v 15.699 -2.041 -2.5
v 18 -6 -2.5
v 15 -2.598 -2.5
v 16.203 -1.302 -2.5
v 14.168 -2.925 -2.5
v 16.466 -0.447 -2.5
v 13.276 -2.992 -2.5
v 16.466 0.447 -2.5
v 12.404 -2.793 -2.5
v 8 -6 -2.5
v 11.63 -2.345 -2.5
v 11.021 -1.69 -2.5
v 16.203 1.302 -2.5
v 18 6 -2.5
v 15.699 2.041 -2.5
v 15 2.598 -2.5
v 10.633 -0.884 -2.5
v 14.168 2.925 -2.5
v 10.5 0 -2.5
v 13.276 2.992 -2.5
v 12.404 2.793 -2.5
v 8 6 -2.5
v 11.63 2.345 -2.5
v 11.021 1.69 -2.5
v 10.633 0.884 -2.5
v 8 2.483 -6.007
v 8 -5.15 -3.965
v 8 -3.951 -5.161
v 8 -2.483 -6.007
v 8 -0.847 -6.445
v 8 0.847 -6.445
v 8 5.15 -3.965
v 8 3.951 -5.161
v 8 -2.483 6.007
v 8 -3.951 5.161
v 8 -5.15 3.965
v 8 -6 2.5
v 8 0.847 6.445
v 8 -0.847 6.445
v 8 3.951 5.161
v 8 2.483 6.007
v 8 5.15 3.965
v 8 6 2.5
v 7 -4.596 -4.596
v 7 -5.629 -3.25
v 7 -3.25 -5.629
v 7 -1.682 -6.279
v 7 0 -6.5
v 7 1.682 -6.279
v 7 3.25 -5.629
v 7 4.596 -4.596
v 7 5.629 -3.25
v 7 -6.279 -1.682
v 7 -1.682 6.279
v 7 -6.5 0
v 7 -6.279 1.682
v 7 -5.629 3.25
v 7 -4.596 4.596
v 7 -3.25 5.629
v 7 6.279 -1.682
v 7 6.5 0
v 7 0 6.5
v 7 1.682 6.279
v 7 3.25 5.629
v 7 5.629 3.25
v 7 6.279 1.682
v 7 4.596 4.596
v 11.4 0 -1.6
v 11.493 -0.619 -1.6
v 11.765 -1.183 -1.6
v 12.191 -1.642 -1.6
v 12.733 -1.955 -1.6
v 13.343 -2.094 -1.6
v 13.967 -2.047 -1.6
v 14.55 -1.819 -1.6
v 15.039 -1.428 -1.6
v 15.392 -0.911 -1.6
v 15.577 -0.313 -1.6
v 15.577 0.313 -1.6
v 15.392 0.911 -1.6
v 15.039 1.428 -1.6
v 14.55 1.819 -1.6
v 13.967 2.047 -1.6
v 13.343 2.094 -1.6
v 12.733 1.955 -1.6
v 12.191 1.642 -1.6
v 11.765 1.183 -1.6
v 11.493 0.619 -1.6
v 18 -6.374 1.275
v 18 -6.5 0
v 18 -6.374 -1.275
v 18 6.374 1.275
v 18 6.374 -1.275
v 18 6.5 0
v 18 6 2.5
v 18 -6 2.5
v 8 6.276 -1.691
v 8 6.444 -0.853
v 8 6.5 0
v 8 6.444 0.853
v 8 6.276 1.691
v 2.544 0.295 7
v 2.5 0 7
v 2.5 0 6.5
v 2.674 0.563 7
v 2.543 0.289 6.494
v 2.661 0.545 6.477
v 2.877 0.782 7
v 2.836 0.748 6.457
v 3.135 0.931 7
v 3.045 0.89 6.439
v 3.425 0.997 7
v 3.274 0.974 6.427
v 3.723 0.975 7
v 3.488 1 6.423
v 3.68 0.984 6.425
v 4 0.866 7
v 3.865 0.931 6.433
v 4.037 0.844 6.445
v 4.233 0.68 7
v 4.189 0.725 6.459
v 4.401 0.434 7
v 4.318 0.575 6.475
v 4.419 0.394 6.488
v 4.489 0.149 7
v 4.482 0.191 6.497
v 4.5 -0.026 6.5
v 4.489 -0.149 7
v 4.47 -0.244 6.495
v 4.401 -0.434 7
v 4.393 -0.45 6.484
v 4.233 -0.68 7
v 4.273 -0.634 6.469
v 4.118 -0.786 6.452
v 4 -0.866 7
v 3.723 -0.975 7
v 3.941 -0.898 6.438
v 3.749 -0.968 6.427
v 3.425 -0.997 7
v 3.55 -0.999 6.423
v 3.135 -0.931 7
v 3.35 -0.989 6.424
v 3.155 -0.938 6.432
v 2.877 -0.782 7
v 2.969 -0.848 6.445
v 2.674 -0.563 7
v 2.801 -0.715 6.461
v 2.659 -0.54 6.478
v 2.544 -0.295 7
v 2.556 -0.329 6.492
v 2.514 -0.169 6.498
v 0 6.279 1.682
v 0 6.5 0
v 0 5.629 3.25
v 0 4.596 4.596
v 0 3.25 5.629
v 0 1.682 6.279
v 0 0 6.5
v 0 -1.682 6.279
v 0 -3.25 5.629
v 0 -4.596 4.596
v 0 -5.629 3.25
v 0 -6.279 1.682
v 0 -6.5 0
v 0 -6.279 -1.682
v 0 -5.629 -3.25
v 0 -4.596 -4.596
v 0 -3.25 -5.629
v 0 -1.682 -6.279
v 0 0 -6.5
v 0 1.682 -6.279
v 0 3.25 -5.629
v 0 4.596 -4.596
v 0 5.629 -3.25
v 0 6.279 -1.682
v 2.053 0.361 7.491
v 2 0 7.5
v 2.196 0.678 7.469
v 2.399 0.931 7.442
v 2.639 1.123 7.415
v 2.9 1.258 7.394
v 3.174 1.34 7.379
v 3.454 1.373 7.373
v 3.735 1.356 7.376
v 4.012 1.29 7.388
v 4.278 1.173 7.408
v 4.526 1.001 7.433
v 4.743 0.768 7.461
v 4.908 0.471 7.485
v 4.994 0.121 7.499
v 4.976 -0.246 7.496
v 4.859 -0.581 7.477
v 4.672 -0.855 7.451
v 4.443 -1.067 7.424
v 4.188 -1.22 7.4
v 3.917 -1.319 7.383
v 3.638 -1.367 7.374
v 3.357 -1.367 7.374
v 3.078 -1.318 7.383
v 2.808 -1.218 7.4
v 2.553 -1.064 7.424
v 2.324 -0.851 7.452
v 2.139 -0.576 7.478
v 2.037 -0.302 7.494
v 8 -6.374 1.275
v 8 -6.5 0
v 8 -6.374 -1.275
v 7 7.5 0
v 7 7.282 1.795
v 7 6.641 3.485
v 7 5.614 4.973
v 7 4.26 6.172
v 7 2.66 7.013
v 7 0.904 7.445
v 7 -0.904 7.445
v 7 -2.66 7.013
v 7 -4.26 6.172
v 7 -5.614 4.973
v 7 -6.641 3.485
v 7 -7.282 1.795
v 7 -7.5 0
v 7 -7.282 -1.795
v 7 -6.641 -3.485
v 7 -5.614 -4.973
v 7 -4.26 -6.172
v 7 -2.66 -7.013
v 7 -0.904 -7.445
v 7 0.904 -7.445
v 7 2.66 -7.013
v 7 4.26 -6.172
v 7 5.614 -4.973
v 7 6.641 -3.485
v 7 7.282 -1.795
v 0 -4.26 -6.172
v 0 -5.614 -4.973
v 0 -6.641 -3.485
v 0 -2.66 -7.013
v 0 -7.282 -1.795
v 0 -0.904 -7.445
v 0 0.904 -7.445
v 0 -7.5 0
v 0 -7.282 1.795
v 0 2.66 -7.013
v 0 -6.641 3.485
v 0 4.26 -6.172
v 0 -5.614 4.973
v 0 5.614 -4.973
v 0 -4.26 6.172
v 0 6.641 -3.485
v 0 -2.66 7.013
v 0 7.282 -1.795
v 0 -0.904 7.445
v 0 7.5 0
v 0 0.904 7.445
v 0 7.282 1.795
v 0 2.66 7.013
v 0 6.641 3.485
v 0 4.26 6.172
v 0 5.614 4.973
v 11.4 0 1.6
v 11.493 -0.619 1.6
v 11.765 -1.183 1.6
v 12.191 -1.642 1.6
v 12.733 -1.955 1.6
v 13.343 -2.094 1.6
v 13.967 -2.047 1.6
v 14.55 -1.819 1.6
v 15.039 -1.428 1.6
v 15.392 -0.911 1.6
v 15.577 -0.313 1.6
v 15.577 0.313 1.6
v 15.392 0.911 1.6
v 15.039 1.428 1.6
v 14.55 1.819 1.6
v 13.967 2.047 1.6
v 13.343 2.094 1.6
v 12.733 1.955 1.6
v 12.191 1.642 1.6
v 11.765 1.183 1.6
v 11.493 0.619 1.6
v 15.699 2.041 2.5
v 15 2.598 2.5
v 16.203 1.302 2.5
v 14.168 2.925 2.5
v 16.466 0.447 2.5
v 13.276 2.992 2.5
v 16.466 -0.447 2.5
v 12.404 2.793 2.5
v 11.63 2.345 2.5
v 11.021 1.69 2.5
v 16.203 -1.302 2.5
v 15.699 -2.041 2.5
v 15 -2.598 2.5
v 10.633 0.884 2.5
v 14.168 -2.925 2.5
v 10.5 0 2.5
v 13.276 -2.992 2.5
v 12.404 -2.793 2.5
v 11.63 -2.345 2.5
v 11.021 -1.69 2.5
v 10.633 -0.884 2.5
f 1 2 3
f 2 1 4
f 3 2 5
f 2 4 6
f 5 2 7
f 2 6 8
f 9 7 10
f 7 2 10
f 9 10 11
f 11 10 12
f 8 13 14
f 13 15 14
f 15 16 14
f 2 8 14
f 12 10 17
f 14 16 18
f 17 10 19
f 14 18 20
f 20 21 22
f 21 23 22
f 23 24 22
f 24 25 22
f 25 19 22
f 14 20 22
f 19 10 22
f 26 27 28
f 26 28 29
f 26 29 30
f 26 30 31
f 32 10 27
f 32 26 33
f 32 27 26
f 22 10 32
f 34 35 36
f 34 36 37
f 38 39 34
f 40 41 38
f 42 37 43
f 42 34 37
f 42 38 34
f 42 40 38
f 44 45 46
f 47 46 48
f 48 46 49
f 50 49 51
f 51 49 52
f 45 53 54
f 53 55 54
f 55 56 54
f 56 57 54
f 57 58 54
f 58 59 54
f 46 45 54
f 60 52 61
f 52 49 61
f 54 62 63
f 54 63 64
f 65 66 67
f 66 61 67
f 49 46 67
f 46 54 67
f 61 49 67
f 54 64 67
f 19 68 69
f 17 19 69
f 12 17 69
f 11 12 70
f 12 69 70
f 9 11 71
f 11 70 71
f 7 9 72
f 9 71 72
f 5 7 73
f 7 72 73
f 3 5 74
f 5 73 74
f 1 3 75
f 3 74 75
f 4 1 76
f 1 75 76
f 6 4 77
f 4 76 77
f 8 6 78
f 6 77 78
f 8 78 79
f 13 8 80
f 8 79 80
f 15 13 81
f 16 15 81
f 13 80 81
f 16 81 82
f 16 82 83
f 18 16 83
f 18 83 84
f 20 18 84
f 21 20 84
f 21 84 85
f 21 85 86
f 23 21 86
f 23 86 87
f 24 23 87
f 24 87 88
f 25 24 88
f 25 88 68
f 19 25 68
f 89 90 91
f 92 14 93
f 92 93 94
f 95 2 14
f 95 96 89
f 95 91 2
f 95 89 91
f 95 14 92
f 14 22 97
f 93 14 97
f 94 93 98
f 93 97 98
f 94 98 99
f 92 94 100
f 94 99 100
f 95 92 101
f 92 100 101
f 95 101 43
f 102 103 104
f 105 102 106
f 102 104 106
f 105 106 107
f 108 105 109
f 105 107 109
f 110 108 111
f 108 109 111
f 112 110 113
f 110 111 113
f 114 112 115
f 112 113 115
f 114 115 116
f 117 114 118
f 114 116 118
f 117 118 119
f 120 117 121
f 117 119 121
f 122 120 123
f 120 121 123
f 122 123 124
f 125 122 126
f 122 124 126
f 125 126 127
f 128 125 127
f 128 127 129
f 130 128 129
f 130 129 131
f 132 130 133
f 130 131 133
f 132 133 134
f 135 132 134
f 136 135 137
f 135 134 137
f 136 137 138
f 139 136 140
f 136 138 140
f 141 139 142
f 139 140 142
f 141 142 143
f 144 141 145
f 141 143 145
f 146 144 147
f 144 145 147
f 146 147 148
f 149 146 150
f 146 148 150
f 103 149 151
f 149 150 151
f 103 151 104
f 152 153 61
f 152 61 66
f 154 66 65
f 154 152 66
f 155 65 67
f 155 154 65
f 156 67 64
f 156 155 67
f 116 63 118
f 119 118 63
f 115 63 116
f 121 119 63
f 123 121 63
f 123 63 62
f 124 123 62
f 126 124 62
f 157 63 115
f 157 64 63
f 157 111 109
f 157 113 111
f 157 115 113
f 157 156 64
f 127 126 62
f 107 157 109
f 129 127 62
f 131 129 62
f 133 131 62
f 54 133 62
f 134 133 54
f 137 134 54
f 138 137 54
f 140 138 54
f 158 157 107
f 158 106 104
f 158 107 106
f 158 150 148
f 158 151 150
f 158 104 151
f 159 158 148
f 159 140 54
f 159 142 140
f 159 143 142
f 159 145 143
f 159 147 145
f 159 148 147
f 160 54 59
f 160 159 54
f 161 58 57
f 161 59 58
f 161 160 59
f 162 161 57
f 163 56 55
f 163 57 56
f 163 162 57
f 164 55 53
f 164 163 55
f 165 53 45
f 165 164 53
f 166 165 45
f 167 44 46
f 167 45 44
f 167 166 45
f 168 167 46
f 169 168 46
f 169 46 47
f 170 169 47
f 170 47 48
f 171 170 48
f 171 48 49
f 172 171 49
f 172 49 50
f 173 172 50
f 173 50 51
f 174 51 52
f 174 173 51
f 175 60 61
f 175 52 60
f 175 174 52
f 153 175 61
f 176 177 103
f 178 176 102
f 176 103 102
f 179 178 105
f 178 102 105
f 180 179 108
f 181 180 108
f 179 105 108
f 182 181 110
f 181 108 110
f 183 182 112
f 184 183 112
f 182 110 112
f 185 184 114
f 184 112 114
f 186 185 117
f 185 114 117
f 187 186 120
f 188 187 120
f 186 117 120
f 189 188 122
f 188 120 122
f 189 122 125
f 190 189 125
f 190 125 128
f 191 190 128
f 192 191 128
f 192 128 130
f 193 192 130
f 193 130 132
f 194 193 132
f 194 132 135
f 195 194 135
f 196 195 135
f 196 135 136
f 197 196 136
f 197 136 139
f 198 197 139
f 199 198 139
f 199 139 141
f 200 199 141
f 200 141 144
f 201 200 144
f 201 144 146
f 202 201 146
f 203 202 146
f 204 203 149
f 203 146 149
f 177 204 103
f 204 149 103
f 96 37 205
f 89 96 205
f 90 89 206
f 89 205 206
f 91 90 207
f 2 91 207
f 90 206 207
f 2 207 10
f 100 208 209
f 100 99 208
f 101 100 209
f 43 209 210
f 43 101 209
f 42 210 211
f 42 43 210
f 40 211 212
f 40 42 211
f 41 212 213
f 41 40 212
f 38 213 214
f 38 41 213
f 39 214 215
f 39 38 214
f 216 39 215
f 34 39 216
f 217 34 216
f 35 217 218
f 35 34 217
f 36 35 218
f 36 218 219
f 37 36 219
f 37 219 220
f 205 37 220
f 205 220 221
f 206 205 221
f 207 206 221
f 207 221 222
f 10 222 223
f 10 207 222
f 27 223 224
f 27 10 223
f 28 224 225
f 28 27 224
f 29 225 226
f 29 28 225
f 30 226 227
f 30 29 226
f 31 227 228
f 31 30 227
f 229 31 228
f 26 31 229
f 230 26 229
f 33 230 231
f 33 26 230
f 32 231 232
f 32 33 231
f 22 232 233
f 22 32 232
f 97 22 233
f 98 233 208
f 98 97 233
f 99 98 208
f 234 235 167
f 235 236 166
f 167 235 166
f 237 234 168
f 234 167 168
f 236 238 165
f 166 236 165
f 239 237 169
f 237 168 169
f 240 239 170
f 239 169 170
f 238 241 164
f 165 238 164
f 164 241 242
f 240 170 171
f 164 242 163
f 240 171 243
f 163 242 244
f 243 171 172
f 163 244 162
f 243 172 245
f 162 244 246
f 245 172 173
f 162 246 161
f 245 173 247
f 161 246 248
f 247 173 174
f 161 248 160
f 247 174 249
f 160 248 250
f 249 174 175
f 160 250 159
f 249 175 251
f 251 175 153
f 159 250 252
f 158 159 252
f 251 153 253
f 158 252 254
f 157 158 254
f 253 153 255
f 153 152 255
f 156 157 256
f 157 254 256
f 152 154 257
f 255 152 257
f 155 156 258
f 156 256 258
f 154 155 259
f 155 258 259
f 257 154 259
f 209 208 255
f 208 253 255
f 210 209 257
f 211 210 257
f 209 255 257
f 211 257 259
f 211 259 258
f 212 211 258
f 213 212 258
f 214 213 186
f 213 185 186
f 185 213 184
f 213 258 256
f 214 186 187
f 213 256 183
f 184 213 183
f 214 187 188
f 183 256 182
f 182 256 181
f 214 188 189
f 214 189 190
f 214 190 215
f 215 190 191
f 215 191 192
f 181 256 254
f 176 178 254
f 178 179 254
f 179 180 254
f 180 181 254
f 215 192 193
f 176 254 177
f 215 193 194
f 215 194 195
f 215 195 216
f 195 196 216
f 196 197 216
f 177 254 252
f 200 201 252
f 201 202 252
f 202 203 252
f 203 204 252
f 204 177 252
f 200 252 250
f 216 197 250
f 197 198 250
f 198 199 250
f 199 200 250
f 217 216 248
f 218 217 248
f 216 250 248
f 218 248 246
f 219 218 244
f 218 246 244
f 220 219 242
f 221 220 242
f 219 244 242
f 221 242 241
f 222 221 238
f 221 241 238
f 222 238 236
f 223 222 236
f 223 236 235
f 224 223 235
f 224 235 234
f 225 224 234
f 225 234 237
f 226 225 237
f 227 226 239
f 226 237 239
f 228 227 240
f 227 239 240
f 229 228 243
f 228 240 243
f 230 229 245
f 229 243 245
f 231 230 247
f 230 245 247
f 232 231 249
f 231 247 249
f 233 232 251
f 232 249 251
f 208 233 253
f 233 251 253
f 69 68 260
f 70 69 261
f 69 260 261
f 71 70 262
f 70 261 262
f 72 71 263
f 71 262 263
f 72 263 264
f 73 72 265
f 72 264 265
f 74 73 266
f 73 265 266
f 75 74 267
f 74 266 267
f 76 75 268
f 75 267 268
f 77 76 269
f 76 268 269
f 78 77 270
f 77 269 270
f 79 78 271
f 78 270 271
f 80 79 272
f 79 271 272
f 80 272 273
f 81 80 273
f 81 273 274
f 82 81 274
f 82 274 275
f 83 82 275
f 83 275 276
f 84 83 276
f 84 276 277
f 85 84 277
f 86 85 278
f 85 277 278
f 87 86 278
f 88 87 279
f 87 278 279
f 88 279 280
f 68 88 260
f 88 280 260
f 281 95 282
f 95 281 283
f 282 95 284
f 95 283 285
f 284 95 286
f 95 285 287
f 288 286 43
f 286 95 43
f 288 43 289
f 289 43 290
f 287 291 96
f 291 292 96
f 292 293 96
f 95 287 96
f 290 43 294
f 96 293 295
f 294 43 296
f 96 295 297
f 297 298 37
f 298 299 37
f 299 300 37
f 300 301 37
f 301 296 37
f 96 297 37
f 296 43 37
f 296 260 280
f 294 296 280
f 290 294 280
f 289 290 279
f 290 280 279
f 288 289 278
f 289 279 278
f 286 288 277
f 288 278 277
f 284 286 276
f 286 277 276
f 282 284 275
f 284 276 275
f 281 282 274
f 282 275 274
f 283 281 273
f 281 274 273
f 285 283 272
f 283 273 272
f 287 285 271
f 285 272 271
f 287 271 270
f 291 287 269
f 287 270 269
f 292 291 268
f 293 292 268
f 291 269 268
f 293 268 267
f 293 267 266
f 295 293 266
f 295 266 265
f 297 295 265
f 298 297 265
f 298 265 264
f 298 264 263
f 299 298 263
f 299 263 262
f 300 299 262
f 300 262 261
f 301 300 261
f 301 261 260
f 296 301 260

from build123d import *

# Parameters (mm, degrees)
F0_R            = 7.5
F1_DEPTH        = 8
F2_T            = -1
F3_SIZE         = 1
F5_DEPTH        = 10
F8_D            = 4.2
F8_DEPTH        = 2.5
F8_CSINK_D      = 6
F8_CSINK_ANGLE  = 90
F11_D           = 4.2
F11_DEPTH       = 2.5
F11_CSINK_D     = 6
F11_CSINK_ANGLE = 90
F15_D           = 2
F15_DEPTH       = 2.5
F15_CSINK_D     = 3
F15_CSINK_ANGLE = 90


with BuildPart() as f1:
    # F0 (on Right) → F1 (new body)
    with BuildSketch(Plane.YZ):
        Circle(F0_R)
    extrude(amount=F1_DEPTH)

    # F2
    f2_openings = [f1.faces().sort_by_distance(p)[0] for p in [
        (0, 0, 0),
    ]]
    offset(amount=F2_T, openings=f2_openings)

    # F3
    f3_edges = [f1.edges().sort_by_distance(p)[0] for p in [
        (8, -7.5, 0),
    ]]
    chamfer(f3_edges, length=F3_SIZE)

    # F4 (on face) → F5 (join)
    with BuildSketch(Plane.YZ.offset(8)):
        with BuildLine():
            Line((-6, -2.5), (0, -2.5))
            Line((0, -2.5), (6, -2.5))
            ThreePointArc((6, -2.5), (6.5, 0), (6, 2.5))
            Line((6, 2.5), (0, 2.5))
            Line((0, 2.5), (-6, 2.5))
            ThreePointArc((-6, 2.5), (-6.5, 0), (-6, -2.5))
        make_face()
    extrude(amount=F5_DEPTH)

    # F8
    with Locations(Plane.XY.offset(2.5)):
        with Locations((13.5, 0)):
            CounterSinkHole(F8_D / 2, F8_CSINK_D / 2, depth=F8_DEPTH, counter_sink_angle=F8_CSINK_ANGLE)

    # F11
    with Locations(Plane(origin=(0, 0, -2.5), x_dir=(1, 0, 0), z_dir=(0, 0, -1))):
        with Locations((13.5, 0)):
            CounterSinkHole(F11_D / 2, F11_CSINK_D / 2, depth=F11_DEPTH, counter_sink_angle=F11_CSINK_ANGLE)

    # F15
    with Locations(Plane.XY.offset(7.5)):
        with Locations((3.5, 0)):
            CounterSinkHole(F15_D / 2, F15_CSINK_D / 2, depth=F15_DEPTH, counter_sink_angle=F15_CSINK_ANGLE)


solid = f1.part
